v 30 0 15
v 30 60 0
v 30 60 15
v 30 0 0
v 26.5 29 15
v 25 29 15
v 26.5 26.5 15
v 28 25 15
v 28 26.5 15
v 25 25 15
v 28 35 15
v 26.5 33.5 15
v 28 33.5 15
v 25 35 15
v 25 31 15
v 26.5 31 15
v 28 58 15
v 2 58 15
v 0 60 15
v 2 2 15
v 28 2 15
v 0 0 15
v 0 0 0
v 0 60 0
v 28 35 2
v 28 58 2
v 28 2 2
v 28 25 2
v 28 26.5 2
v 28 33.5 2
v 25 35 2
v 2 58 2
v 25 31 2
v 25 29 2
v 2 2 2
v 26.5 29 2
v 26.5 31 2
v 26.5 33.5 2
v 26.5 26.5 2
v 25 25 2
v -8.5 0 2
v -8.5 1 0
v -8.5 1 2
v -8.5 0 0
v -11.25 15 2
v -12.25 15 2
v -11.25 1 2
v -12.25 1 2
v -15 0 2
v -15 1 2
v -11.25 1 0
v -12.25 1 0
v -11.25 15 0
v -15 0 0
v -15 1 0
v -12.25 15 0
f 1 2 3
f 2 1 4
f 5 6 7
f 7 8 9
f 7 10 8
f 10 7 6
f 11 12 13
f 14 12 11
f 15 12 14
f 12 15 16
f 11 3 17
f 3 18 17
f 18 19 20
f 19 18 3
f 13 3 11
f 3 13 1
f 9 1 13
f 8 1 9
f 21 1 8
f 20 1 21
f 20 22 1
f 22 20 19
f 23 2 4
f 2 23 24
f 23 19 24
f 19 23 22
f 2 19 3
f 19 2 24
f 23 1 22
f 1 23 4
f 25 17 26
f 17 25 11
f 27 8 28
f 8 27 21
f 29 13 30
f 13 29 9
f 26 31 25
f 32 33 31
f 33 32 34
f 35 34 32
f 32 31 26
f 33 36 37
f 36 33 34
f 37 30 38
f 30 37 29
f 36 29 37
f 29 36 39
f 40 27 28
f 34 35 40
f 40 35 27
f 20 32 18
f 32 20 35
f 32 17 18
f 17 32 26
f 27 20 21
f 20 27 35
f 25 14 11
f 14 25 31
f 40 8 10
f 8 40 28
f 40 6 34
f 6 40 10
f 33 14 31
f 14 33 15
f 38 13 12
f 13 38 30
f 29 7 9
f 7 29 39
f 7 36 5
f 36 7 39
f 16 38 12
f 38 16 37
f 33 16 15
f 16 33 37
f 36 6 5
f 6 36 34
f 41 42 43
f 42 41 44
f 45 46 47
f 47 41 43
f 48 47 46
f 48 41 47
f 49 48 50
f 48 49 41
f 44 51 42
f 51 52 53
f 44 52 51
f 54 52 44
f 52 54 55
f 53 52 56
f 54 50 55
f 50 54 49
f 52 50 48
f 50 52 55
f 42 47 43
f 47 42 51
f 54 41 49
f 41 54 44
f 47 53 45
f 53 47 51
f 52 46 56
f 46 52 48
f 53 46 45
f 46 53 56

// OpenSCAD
CxLargura=30;
CxComprimento=60;
CxAltura=15;

caixa();
//tampa();

translate([-15,0,0]){
        trava();    
    
}




module caixa(){
    difference(){
        cube([CxLargura,CxComprimento,CxAltura]);
        translate([2, 2, 2]) {
            cube([CxLargura-4,CxComprimento-4,CxAltura]);
        }
    }
    translate([CxLargura-2,CxComprimento/2-5,2]){
        rotate([0,0,90]){
            difference(){
                cube([10,3,CxAltura-2]);
                translate([1.5,-1,-1]){
                    cube([7,2.5,CxAltura]);
                }
                translate([4,1.4,-1]){
                    cube([2,2.5,CxAltura]);
                }
            }

        }
    }
}

module trava(){
    cube([6.5,1,2]);
    translate([2.75,0,0]){
        cube([1,CxLargura/2,2]);
    }
    translate([3.25,CxLargura/2,0]){
        rotate([90,0,90]){
            $fn=64;
            intersection() {
                circle(r=2);
                square(2);
                //rotate(90) square(2);
            }
        }

    }

}
